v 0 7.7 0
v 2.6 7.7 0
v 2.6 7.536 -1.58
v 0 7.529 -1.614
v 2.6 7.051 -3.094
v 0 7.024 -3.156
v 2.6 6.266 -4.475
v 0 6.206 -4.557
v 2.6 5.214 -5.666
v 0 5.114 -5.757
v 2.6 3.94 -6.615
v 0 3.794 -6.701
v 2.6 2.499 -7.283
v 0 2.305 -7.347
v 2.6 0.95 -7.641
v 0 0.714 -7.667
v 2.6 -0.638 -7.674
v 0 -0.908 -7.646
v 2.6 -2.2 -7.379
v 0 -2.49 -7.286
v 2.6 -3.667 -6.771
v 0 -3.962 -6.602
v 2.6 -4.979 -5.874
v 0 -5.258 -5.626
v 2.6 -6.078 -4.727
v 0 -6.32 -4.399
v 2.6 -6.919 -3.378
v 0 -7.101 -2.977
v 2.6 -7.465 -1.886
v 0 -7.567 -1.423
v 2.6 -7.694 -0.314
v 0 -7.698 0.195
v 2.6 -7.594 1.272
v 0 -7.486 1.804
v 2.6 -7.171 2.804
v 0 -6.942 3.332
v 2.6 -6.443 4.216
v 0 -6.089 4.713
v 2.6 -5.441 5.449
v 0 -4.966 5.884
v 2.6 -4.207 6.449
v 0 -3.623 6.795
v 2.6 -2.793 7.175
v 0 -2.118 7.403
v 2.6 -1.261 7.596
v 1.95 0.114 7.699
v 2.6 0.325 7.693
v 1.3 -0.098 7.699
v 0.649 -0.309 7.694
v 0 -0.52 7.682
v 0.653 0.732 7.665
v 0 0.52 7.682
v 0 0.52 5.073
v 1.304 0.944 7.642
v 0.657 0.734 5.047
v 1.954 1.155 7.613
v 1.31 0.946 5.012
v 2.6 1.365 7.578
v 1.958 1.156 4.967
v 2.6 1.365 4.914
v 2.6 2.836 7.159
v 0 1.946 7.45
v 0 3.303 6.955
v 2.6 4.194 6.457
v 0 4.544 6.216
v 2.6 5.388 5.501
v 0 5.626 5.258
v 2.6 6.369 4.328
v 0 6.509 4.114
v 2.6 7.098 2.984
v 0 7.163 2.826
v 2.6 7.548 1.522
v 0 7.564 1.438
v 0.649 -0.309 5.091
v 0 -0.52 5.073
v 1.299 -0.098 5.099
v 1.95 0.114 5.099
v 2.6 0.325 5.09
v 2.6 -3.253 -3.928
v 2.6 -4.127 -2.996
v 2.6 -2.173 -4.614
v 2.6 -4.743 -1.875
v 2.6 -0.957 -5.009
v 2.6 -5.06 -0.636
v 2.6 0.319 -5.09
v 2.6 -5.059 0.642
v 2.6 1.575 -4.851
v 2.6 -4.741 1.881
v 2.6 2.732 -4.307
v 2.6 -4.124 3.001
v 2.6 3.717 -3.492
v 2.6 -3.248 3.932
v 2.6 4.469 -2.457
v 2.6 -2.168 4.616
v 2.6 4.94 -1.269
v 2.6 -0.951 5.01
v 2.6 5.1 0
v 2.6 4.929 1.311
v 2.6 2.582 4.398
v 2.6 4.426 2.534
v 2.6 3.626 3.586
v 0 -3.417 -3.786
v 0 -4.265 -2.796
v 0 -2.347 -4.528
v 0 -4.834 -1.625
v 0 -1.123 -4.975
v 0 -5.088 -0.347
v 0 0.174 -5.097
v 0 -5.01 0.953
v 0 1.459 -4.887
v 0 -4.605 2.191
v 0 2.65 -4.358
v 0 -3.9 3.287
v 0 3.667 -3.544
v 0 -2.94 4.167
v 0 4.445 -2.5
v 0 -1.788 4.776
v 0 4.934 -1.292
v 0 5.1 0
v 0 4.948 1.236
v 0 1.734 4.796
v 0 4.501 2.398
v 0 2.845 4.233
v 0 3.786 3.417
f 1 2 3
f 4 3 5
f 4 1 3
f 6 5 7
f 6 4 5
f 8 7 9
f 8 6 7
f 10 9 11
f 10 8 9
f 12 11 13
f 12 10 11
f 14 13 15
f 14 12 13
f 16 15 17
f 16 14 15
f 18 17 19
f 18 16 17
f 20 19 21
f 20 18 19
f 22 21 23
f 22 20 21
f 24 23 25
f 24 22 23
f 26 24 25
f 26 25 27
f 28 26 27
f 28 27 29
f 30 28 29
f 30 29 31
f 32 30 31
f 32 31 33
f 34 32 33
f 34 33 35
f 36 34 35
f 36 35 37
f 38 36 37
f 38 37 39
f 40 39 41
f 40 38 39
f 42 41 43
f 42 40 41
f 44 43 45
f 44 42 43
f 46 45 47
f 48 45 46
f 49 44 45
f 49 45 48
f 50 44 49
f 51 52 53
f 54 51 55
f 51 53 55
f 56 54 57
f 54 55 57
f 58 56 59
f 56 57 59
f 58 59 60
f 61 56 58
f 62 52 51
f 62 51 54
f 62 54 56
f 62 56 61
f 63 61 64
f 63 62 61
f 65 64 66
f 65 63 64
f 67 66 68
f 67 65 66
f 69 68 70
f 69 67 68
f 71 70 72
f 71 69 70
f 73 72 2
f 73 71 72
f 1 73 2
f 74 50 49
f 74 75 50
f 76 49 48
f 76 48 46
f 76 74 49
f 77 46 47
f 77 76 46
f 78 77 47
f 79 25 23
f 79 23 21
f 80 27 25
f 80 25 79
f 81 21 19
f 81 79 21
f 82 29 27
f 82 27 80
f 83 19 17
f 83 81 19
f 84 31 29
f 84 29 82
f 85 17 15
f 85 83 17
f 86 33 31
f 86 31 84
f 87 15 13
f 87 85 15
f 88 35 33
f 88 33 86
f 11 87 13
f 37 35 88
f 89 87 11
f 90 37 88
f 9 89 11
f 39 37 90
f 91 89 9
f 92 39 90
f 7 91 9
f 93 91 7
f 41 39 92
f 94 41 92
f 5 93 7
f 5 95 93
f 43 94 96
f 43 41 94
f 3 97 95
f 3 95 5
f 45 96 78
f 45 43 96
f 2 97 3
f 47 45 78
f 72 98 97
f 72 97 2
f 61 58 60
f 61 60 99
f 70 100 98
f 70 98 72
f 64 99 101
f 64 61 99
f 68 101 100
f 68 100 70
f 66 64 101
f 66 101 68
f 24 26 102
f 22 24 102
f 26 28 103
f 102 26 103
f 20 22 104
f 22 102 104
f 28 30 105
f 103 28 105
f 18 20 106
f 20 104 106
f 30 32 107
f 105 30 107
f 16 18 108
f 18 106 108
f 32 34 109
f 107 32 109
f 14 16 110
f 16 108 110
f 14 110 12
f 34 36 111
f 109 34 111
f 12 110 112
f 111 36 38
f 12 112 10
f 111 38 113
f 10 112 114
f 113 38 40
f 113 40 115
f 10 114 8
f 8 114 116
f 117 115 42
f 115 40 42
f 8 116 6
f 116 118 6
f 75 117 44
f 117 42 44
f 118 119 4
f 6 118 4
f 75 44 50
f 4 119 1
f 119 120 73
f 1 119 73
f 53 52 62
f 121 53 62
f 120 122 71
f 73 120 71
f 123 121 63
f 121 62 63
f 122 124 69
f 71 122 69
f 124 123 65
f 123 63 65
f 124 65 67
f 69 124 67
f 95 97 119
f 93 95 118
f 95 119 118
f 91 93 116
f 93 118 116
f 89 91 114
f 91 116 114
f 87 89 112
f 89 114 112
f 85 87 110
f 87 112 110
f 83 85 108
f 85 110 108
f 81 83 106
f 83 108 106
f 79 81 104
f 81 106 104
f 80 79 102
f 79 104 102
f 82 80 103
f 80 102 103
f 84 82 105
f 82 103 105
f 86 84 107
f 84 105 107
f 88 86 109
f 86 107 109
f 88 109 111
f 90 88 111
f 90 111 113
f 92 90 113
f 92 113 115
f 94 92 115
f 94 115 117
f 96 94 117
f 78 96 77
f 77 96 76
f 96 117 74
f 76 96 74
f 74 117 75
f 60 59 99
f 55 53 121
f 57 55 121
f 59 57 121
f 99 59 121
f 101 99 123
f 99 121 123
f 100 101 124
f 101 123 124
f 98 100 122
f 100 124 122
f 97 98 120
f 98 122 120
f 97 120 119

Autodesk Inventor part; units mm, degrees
ref_plane "YZ Plane" through (0, 0, 0) normal (1, 0, 0) x (0, 1, 0)
ref_plane "XZ Plane" through (0, 0, 0) normal (0, 1, 0) x (-1, 0, 0)
sketch "草图1" plane through (0, 0, 0) normal (1, 0, 0) x (0, 1, 0)
  circle A0 centre (0, 0) radius 7.7
  circle A1 centre (0, 0) radius 5.1
  dimension "d0" = 10.2
  dimension "d1" = 15.4
extrude "轴承体" add sketch "草图1" along normal blind 2.6
sketch "草图2" plane through (0, 0, 0) normal (0, 0, 1) x (1, 0, 0)
  line L0 (0, -5.1) -> (0, 5.1) projected
  line L1 (2.6, 7.7) -> (2.6, -7.7) projected
  line L2 (-1.2, 0) -> (7.2, 0) projected
  line L3 (0, -0.52) -> (2.6, 0.3248)
  line L4 (0, 0.52) -> (2.6, 1.3648)
  dimension "d4" = 0.52
  dimension "d5" = 0.52
  dimension "d6" = 72
extrude "切口" cut sketch "草图2" along normal up to next contours L0 L2 L3 | L0 L4 L1 L3 L2
ref_plane "Work Plane1" through (0, 0, 0) normal (0, -1, 0) x (1, 0, 0)
equation "\"d0\" = SD1"
equation "\"d1\" = SD2"
equation "\"d2\" = SD"
equation "\"d4\" = 0.2 * SD"
equation "\"d5\" = 0.2 * SD"
equation "\"d6\" = FAWI"
equation "\"d7\" = SD"
equation "\"SD1\" = 10.2"
equation "\"SD2\" = 15.4"
equation "\"SD\" = 2.6"
equation "\"FAWI\" = 72deg"
properties part number "垫圈 GB 93-87 10" material "钢，软"
